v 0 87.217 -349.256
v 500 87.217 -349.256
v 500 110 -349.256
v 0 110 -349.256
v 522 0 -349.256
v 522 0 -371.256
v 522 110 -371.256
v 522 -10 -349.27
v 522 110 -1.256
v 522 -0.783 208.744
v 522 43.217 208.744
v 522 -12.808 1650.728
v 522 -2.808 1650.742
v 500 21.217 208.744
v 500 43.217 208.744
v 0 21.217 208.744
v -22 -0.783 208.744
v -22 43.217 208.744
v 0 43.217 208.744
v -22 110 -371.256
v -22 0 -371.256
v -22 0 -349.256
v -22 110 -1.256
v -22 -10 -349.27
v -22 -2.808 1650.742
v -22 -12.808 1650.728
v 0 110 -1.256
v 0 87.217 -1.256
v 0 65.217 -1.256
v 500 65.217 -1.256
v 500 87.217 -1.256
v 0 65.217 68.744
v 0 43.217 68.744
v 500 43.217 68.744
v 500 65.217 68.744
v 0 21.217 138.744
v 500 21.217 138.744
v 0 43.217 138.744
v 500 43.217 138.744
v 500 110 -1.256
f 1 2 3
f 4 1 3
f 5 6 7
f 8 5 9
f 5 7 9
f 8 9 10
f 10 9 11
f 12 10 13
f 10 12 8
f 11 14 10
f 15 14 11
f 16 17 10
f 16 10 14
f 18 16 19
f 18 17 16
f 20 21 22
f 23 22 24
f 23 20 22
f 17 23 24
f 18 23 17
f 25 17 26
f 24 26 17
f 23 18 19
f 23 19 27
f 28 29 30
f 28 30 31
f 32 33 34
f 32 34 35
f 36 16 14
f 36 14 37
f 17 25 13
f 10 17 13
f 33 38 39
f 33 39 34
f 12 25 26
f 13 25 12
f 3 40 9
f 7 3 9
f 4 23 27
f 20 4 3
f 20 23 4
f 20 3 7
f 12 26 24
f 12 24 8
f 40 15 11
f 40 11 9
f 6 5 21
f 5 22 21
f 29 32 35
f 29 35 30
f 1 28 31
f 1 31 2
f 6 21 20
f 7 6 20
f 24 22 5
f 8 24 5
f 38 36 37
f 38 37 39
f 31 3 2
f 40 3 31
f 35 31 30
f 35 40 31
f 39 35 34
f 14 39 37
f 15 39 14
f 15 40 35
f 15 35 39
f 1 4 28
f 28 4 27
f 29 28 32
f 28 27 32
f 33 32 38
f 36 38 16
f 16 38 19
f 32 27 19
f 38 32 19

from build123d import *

# Parameters (mm, degrees)
BOSS_EXTRUDE1_DEPTH = 500
BOSS_EXTRUDE2_DEPTH = 22
LPATTERN1_COUNT     = 2
LPATTERN1_PITCH     = 522
SKETCH3_W           = 22
SKETCH3_H           = 110
BOSS_EXTRUDE3_DEPTH = 500
SKETCH4_W           = 544
SKETCH4_H           = 2000
BOSS_EXTRUDE4_DEPTH = 10


with BuildPart() as part:
    # Sketch1 → Boss-Extrude1 (new body)
    with BuildSketch(Plane(origin=(0, 0, 0), x_dir=(0, 0, -1), z_dir=(1, 0, 0))):
        Polygon((1.256226638, 87.216565021), (349.256226638, 87.216565021), (349.256226638, 0), (-208.743773362, -0.783434979), (-208.743773362, 21.216565021), (-138.743773362, 21.216565021), (-138.743773362, 43.216565021), (-68.743773362, 43.216565021), (-68.743773362, 65.216565021), (1.256226638, 65.216565021), align=None)
    extrude(amount=BOSS_EXTRUDE1_DEPTH)

    # Sketch2 → Boss-Extrude2 (add)
    with BuildSketch(Plane(origin=(500, 0, 0), x_dir=(0, 0, -1), z_dir=(1, 0, 0))):
        Polygon((-208.743773362, -0.783434979), (-208.743773362, 43.216565021), (1.256226638, 110), (371.256226638, 110), (371.256226638, 0), (349.256226638, 0), align=None)
    boss_extrude2 = extrude(amount=BOSS_EXTRUDE2_DEPTH)

    # LPattern1: Boss-Extrude2 ×2
    with Locations(*[(-i * LPATTERN1_PITCH, 0, 0) for i in range(1, LPATTERN1_COUNT)]):
        add(boss_extrude2)

    # Sketch3 → Boss-Extrude3 (add)
    with BuildSketch(Plane(origin=(0, 0, 0), x_dir=(0, 0, -1), z_dir=(1, 0, 0))):
        with Locations((360.256226638, 55)):
            Rectangle(SKETCH3_W, SKETCH3_H)
    extrude(amount=BOSS_EXTRUDE3_DEPTH)

    # Sketch4 → Boss-Extrude4 (add)
    with BuildSketch(Plane(origin=(0, -0.49035664, -0.000688463), x_dir=(1, 0, 0), z_dir=(0, -0.9999990143859607, -0.0014040039555169115))):
        with Locations((250, 650.744117594)):
            Rectangle(SKETCH4_W, SKETCH4_H)
    extrude(amount=BOSS_EXTRUDE4_DEPTH)


solid = part.part
